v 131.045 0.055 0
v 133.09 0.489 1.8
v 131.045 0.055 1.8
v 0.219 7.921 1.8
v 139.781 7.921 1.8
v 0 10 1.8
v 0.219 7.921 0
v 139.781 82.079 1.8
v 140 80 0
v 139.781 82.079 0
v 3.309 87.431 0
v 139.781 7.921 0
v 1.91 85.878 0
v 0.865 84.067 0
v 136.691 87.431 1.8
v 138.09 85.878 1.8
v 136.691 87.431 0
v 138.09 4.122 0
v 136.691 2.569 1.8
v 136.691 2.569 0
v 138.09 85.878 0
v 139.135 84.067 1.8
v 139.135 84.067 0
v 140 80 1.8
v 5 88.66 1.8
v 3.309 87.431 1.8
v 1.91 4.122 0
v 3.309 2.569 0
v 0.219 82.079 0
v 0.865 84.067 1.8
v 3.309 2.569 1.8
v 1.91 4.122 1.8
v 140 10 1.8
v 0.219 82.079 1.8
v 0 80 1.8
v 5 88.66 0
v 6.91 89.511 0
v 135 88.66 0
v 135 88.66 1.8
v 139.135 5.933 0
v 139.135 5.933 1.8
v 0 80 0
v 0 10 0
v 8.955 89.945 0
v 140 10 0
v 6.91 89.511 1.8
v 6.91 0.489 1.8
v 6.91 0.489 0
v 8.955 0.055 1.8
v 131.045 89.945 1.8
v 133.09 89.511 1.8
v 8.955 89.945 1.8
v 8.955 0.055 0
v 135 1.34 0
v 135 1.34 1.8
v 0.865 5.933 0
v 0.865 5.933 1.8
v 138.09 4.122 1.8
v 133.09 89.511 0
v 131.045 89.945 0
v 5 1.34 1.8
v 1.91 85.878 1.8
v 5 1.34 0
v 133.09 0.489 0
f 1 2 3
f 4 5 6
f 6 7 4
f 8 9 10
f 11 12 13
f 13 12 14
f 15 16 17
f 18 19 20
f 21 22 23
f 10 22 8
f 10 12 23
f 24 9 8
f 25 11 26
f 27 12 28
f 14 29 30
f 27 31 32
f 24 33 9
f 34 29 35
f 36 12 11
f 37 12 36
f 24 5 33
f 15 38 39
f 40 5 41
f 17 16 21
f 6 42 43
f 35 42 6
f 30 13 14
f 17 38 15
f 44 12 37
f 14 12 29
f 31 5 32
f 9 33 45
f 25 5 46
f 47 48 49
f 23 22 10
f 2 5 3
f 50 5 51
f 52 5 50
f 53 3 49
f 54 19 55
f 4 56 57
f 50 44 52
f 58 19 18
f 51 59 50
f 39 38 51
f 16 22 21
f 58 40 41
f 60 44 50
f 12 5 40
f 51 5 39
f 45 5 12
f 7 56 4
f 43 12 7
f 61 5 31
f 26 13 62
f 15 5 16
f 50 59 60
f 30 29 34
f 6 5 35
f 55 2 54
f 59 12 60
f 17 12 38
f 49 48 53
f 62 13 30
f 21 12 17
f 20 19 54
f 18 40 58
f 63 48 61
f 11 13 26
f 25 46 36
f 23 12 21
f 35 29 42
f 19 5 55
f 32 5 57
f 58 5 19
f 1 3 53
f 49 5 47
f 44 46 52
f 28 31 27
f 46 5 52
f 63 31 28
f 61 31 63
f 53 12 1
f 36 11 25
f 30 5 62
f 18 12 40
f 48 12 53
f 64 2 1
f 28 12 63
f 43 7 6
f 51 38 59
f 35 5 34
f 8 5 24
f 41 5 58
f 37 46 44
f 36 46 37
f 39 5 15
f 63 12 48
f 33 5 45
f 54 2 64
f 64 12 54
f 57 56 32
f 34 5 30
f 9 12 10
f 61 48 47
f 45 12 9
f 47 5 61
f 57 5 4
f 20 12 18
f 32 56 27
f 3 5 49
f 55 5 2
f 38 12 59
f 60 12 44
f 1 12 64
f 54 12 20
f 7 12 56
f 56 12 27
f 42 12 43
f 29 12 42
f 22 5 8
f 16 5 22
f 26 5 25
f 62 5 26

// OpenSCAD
hull(){
    translate([130, 80, 0])
    cylinder(r = 10, h = 1.8);
    translate([130, 10, 0])
    cylinder(r = 10, h = 1.8);
    translate([10, 10, 0])
    cylinder(r = 10, h = 1.8);
    translate([10, 80, 0])
    cylinder(r = 10, h = 1.8);
}
